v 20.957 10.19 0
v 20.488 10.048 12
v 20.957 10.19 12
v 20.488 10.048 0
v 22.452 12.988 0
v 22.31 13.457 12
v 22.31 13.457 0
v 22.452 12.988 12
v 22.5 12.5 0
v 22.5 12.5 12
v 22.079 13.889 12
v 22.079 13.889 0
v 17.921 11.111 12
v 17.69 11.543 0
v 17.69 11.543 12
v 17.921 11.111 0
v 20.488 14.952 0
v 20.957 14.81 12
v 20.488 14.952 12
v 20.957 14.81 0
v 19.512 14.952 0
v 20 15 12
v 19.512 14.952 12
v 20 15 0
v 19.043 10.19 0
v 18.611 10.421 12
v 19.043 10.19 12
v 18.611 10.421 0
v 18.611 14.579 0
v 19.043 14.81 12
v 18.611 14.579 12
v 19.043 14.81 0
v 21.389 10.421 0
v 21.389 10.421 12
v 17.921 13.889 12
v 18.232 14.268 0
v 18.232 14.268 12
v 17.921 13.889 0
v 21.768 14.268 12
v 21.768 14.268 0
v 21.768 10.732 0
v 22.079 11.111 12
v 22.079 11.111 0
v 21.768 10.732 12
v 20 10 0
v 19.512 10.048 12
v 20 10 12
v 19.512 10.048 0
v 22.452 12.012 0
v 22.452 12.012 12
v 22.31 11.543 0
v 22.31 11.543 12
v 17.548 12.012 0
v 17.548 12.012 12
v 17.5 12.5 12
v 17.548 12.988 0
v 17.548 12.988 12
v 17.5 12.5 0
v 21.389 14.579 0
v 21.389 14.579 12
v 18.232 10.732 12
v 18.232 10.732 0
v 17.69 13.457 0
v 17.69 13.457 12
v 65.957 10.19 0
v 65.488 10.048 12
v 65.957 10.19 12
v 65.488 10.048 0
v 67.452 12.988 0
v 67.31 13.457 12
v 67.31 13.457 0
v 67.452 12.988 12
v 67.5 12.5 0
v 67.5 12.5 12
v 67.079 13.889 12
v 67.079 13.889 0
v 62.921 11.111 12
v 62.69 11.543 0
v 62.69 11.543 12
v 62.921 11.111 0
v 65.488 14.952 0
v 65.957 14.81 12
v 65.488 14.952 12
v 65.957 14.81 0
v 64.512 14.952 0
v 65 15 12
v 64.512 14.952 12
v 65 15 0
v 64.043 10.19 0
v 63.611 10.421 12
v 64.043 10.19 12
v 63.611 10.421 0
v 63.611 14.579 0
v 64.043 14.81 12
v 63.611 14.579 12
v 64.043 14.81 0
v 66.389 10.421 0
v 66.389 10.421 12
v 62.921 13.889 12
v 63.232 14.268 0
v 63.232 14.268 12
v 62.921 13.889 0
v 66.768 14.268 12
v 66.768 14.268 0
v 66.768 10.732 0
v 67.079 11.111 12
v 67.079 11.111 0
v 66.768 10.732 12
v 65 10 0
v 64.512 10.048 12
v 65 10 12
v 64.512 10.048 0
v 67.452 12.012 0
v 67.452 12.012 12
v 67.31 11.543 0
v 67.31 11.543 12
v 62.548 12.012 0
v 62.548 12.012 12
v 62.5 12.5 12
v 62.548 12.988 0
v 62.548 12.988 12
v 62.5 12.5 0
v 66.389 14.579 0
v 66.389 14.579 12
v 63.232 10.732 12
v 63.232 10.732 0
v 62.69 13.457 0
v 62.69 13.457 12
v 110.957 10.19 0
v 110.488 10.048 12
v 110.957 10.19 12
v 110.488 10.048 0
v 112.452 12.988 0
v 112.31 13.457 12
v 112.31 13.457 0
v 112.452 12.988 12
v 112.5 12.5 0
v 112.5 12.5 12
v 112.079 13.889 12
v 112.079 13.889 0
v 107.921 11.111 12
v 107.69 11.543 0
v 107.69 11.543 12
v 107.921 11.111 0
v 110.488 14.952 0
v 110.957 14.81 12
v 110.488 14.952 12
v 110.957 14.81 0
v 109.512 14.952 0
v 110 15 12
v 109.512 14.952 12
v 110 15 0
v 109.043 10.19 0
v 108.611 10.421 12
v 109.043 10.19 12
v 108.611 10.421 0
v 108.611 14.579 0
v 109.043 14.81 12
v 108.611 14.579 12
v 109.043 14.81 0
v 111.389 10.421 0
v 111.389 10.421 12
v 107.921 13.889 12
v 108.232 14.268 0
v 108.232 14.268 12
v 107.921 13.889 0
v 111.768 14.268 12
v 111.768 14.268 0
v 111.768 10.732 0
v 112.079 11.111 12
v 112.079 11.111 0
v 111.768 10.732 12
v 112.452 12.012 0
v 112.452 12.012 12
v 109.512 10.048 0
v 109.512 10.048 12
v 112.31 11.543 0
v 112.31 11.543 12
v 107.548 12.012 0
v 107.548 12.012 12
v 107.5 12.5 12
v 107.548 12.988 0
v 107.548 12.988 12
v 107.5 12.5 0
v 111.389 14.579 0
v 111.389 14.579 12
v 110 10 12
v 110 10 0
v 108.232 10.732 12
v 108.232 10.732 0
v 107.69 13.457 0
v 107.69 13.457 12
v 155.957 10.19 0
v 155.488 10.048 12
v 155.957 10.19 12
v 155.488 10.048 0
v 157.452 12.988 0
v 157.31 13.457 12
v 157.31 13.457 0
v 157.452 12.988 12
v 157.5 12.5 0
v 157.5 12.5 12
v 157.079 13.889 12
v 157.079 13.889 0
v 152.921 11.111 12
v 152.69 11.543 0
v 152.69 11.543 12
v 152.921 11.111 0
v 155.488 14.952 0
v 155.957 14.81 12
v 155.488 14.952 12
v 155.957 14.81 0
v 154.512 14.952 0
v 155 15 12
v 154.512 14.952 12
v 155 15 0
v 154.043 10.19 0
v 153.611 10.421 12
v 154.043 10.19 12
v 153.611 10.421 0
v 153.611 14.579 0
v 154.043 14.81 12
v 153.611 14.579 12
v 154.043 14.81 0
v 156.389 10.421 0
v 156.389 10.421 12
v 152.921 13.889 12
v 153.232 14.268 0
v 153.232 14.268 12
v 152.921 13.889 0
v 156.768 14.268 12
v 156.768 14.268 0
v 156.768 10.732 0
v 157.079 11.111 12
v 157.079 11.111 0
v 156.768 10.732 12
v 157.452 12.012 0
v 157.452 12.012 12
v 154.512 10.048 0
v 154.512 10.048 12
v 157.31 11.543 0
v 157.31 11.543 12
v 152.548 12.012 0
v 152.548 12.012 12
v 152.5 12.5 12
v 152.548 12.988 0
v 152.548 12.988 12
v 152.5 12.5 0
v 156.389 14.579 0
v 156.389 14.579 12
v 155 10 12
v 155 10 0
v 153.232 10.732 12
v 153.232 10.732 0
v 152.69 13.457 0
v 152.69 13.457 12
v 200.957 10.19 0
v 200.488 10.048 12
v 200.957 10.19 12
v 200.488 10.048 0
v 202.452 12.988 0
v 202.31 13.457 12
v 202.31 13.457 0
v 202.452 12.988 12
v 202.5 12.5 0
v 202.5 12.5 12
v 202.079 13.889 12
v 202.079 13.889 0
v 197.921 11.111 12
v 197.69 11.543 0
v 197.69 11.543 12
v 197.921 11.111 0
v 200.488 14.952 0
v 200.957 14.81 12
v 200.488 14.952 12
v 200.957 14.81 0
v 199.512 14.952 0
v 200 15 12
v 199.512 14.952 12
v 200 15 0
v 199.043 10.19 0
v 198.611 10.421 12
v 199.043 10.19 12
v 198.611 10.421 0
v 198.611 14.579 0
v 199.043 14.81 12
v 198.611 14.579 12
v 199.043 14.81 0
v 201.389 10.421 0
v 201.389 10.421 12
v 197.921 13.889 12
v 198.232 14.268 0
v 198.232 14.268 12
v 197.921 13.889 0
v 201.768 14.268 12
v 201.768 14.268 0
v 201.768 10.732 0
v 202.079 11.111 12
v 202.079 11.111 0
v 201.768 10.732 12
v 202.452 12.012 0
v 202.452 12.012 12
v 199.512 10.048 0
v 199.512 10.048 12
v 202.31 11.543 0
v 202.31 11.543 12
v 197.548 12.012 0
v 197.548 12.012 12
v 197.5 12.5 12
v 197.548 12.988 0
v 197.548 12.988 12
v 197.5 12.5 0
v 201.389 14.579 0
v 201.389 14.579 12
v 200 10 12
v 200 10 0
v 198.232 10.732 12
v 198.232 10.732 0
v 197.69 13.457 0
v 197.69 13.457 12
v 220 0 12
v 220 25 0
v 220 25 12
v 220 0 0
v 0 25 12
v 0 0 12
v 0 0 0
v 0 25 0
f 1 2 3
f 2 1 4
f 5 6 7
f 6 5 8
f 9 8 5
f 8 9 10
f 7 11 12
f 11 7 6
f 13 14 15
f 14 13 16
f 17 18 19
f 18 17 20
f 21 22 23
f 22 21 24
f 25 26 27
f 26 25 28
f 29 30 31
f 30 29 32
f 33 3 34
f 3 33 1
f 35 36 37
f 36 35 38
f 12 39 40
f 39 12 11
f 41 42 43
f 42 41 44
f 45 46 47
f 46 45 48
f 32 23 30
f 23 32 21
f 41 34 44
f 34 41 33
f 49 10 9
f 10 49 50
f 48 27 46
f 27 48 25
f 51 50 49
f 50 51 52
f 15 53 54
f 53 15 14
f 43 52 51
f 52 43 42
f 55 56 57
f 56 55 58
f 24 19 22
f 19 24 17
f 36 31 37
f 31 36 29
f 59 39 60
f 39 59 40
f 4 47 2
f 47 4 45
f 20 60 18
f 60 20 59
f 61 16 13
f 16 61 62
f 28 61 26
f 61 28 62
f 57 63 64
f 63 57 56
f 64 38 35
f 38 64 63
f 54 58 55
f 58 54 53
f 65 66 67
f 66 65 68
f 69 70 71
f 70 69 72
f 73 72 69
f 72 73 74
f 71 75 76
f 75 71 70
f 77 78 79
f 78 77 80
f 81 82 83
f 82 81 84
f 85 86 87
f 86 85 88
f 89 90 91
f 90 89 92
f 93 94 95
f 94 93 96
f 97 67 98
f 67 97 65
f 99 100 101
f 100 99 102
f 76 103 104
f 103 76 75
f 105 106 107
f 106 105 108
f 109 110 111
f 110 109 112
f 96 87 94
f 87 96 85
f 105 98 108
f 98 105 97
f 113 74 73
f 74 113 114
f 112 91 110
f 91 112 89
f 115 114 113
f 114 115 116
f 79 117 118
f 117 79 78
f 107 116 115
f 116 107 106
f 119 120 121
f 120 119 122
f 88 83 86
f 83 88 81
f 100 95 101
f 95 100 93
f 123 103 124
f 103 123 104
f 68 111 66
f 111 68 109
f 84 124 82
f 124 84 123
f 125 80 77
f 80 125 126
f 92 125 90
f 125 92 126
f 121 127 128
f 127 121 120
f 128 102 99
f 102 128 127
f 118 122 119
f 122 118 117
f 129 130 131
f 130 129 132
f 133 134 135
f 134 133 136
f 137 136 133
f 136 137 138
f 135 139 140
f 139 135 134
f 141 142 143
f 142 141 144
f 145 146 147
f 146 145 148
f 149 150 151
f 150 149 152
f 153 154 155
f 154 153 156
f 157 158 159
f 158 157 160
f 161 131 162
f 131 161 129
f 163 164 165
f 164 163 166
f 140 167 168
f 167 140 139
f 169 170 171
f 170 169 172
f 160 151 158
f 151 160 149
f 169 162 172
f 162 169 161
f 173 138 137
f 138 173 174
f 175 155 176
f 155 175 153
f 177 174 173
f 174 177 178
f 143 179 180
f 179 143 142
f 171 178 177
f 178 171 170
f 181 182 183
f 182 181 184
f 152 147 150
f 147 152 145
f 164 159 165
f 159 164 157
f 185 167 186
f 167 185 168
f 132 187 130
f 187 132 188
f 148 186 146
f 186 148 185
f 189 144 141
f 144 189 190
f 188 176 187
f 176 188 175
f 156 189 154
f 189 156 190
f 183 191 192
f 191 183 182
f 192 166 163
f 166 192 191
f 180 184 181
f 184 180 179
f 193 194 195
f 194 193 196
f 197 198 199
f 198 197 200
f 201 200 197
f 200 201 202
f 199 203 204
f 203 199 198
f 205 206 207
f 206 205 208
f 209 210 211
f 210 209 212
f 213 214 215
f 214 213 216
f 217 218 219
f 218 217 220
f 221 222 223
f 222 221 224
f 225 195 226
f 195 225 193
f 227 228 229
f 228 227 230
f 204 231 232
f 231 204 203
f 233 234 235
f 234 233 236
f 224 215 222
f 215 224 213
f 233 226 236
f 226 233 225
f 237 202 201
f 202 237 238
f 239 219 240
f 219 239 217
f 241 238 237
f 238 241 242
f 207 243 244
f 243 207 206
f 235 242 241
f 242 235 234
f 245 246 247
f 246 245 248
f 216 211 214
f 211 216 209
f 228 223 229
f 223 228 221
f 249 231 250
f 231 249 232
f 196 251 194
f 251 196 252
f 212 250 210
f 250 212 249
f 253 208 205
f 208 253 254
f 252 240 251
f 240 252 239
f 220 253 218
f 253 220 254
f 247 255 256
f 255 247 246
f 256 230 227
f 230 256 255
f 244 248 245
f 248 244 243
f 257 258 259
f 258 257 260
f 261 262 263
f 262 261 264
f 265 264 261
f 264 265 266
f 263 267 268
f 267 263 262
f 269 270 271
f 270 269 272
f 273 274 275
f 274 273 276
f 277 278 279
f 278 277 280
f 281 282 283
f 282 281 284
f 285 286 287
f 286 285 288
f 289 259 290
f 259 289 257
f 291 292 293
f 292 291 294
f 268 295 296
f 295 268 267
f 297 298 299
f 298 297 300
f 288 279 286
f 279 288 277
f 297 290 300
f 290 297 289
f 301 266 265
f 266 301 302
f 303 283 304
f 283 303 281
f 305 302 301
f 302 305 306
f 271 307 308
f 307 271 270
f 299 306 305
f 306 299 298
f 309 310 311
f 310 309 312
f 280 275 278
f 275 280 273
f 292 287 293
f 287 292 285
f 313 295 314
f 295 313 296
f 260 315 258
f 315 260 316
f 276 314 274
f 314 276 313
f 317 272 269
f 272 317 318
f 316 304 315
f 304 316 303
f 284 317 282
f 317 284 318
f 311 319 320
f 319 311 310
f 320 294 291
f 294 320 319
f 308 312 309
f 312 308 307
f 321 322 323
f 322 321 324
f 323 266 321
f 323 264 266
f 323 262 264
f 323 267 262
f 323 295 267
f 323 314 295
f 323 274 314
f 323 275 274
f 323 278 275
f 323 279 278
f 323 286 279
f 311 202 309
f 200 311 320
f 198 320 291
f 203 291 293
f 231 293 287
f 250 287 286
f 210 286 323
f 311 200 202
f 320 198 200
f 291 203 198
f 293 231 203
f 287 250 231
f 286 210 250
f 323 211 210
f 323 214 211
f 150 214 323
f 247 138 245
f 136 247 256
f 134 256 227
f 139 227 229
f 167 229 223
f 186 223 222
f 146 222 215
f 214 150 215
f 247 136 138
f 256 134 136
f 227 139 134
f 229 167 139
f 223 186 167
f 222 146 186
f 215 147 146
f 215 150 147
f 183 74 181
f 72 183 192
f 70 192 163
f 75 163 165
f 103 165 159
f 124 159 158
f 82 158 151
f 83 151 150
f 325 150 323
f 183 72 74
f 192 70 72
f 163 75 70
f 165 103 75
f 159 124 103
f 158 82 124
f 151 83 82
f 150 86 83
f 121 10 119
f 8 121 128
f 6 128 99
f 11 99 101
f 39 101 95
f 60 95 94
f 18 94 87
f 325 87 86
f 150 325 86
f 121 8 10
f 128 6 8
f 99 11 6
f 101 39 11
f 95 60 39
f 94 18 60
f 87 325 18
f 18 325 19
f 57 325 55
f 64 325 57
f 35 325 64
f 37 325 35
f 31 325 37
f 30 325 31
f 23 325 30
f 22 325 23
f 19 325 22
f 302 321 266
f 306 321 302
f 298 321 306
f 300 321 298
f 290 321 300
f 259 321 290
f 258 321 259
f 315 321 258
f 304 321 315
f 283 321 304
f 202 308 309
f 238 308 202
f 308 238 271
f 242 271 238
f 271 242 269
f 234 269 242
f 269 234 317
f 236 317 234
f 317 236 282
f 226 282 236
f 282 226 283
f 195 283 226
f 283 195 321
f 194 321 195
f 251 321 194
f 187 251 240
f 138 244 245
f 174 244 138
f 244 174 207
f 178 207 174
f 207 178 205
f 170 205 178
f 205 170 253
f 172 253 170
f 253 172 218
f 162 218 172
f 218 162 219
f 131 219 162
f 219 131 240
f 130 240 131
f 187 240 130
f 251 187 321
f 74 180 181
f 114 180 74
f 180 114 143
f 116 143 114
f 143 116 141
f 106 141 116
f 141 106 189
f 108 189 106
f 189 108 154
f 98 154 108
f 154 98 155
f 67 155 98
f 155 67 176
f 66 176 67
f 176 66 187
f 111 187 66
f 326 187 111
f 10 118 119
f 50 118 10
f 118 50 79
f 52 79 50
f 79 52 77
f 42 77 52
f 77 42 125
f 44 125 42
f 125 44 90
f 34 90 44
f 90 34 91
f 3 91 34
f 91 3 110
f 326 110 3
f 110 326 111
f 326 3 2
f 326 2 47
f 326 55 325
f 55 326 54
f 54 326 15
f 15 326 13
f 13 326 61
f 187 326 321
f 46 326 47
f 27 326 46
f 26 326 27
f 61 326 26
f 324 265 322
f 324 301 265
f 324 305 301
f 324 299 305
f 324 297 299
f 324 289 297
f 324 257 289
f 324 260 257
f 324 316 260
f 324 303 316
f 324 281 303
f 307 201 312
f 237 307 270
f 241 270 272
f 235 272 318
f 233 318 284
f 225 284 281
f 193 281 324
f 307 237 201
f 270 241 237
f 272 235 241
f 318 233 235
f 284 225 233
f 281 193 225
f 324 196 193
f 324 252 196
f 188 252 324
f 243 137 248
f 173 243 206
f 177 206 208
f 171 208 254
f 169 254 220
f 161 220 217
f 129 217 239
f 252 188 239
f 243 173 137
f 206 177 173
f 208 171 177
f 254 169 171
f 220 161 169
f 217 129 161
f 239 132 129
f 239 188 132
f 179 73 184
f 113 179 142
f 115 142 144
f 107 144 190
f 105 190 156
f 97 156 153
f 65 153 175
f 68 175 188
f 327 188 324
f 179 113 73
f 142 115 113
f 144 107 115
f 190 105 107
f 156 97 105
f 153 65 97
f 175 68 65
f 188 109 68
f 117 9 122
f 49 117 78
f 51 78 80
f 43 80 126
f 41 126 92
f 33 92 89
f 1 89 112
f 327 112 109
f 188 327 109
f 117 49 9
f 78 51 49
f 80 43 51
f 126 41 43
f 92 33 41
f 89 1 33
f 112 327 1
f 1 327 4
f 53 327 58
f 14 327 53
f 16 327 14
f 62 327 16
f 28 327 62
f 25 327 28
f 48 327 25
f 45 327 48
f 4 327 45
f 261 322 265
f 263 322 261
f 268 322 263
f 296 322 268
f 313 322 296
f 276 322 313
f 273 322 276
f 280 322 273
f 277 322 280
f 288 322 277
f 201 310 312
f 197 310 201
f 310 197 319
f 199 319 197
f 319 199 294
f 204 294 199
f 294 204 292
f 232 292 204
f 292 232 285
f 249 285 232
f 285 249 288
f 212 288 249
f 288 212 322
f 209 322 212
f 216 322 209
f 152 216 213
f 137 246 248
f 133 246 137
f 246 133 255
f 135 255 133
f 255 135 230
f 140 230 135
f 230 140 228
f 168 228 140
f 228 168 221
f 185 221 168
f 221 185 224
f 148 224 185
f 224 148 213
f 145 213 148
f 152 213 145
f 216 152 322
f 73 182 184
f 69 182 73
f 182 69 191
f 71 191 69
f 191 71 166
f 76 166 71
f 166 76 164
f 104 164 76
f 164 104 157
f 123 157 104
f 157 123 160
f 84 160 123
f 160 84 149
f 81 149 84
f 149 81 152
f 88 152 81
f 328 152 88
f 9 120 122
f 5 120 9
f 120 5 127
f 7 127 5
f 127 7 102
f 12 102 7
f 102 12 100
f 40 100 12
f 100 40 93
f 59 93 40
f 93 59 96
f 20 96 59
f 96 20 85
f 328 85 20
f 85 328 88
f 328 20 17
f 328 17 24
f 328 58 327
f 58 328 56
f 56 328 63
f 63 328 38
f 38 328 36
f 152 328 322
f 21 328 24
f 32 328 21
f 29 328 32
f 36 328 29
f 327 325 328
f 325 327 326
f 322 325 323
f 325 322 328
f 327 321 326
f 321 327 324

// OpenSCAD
$fn = 32;

// ----------------------------------------------------------------------
// Long rail: 200-250 mm mounting rail
// ----------------------------------------------------------------------

// --- parameters (mm) ---
rail_l = 220;             // rail length, X
rail_w = 25;              // rail width, Y
rail_t = 12;              // rail thickness, Z
hole_d = 5;               // mounting hole diameter
hole_start = 20;          // first hole offset from the end
hole_pitch = 45;          // hole pitch
holes = 5;                // number of holes
fit_tol = 0.1;            // tolerance for press fits, mm
free_tol = 0.3;           // tolerance for clearance fits, mm

difference() {
  cube([rail_l, rail_w, rail_t]);
  for (i = [0 : holes - 1])
    translate([hole_start + i * hole_pitch, rail_w / 2, -1])
      cylinder(h = rail_t + 2, d = hole_d);
}
